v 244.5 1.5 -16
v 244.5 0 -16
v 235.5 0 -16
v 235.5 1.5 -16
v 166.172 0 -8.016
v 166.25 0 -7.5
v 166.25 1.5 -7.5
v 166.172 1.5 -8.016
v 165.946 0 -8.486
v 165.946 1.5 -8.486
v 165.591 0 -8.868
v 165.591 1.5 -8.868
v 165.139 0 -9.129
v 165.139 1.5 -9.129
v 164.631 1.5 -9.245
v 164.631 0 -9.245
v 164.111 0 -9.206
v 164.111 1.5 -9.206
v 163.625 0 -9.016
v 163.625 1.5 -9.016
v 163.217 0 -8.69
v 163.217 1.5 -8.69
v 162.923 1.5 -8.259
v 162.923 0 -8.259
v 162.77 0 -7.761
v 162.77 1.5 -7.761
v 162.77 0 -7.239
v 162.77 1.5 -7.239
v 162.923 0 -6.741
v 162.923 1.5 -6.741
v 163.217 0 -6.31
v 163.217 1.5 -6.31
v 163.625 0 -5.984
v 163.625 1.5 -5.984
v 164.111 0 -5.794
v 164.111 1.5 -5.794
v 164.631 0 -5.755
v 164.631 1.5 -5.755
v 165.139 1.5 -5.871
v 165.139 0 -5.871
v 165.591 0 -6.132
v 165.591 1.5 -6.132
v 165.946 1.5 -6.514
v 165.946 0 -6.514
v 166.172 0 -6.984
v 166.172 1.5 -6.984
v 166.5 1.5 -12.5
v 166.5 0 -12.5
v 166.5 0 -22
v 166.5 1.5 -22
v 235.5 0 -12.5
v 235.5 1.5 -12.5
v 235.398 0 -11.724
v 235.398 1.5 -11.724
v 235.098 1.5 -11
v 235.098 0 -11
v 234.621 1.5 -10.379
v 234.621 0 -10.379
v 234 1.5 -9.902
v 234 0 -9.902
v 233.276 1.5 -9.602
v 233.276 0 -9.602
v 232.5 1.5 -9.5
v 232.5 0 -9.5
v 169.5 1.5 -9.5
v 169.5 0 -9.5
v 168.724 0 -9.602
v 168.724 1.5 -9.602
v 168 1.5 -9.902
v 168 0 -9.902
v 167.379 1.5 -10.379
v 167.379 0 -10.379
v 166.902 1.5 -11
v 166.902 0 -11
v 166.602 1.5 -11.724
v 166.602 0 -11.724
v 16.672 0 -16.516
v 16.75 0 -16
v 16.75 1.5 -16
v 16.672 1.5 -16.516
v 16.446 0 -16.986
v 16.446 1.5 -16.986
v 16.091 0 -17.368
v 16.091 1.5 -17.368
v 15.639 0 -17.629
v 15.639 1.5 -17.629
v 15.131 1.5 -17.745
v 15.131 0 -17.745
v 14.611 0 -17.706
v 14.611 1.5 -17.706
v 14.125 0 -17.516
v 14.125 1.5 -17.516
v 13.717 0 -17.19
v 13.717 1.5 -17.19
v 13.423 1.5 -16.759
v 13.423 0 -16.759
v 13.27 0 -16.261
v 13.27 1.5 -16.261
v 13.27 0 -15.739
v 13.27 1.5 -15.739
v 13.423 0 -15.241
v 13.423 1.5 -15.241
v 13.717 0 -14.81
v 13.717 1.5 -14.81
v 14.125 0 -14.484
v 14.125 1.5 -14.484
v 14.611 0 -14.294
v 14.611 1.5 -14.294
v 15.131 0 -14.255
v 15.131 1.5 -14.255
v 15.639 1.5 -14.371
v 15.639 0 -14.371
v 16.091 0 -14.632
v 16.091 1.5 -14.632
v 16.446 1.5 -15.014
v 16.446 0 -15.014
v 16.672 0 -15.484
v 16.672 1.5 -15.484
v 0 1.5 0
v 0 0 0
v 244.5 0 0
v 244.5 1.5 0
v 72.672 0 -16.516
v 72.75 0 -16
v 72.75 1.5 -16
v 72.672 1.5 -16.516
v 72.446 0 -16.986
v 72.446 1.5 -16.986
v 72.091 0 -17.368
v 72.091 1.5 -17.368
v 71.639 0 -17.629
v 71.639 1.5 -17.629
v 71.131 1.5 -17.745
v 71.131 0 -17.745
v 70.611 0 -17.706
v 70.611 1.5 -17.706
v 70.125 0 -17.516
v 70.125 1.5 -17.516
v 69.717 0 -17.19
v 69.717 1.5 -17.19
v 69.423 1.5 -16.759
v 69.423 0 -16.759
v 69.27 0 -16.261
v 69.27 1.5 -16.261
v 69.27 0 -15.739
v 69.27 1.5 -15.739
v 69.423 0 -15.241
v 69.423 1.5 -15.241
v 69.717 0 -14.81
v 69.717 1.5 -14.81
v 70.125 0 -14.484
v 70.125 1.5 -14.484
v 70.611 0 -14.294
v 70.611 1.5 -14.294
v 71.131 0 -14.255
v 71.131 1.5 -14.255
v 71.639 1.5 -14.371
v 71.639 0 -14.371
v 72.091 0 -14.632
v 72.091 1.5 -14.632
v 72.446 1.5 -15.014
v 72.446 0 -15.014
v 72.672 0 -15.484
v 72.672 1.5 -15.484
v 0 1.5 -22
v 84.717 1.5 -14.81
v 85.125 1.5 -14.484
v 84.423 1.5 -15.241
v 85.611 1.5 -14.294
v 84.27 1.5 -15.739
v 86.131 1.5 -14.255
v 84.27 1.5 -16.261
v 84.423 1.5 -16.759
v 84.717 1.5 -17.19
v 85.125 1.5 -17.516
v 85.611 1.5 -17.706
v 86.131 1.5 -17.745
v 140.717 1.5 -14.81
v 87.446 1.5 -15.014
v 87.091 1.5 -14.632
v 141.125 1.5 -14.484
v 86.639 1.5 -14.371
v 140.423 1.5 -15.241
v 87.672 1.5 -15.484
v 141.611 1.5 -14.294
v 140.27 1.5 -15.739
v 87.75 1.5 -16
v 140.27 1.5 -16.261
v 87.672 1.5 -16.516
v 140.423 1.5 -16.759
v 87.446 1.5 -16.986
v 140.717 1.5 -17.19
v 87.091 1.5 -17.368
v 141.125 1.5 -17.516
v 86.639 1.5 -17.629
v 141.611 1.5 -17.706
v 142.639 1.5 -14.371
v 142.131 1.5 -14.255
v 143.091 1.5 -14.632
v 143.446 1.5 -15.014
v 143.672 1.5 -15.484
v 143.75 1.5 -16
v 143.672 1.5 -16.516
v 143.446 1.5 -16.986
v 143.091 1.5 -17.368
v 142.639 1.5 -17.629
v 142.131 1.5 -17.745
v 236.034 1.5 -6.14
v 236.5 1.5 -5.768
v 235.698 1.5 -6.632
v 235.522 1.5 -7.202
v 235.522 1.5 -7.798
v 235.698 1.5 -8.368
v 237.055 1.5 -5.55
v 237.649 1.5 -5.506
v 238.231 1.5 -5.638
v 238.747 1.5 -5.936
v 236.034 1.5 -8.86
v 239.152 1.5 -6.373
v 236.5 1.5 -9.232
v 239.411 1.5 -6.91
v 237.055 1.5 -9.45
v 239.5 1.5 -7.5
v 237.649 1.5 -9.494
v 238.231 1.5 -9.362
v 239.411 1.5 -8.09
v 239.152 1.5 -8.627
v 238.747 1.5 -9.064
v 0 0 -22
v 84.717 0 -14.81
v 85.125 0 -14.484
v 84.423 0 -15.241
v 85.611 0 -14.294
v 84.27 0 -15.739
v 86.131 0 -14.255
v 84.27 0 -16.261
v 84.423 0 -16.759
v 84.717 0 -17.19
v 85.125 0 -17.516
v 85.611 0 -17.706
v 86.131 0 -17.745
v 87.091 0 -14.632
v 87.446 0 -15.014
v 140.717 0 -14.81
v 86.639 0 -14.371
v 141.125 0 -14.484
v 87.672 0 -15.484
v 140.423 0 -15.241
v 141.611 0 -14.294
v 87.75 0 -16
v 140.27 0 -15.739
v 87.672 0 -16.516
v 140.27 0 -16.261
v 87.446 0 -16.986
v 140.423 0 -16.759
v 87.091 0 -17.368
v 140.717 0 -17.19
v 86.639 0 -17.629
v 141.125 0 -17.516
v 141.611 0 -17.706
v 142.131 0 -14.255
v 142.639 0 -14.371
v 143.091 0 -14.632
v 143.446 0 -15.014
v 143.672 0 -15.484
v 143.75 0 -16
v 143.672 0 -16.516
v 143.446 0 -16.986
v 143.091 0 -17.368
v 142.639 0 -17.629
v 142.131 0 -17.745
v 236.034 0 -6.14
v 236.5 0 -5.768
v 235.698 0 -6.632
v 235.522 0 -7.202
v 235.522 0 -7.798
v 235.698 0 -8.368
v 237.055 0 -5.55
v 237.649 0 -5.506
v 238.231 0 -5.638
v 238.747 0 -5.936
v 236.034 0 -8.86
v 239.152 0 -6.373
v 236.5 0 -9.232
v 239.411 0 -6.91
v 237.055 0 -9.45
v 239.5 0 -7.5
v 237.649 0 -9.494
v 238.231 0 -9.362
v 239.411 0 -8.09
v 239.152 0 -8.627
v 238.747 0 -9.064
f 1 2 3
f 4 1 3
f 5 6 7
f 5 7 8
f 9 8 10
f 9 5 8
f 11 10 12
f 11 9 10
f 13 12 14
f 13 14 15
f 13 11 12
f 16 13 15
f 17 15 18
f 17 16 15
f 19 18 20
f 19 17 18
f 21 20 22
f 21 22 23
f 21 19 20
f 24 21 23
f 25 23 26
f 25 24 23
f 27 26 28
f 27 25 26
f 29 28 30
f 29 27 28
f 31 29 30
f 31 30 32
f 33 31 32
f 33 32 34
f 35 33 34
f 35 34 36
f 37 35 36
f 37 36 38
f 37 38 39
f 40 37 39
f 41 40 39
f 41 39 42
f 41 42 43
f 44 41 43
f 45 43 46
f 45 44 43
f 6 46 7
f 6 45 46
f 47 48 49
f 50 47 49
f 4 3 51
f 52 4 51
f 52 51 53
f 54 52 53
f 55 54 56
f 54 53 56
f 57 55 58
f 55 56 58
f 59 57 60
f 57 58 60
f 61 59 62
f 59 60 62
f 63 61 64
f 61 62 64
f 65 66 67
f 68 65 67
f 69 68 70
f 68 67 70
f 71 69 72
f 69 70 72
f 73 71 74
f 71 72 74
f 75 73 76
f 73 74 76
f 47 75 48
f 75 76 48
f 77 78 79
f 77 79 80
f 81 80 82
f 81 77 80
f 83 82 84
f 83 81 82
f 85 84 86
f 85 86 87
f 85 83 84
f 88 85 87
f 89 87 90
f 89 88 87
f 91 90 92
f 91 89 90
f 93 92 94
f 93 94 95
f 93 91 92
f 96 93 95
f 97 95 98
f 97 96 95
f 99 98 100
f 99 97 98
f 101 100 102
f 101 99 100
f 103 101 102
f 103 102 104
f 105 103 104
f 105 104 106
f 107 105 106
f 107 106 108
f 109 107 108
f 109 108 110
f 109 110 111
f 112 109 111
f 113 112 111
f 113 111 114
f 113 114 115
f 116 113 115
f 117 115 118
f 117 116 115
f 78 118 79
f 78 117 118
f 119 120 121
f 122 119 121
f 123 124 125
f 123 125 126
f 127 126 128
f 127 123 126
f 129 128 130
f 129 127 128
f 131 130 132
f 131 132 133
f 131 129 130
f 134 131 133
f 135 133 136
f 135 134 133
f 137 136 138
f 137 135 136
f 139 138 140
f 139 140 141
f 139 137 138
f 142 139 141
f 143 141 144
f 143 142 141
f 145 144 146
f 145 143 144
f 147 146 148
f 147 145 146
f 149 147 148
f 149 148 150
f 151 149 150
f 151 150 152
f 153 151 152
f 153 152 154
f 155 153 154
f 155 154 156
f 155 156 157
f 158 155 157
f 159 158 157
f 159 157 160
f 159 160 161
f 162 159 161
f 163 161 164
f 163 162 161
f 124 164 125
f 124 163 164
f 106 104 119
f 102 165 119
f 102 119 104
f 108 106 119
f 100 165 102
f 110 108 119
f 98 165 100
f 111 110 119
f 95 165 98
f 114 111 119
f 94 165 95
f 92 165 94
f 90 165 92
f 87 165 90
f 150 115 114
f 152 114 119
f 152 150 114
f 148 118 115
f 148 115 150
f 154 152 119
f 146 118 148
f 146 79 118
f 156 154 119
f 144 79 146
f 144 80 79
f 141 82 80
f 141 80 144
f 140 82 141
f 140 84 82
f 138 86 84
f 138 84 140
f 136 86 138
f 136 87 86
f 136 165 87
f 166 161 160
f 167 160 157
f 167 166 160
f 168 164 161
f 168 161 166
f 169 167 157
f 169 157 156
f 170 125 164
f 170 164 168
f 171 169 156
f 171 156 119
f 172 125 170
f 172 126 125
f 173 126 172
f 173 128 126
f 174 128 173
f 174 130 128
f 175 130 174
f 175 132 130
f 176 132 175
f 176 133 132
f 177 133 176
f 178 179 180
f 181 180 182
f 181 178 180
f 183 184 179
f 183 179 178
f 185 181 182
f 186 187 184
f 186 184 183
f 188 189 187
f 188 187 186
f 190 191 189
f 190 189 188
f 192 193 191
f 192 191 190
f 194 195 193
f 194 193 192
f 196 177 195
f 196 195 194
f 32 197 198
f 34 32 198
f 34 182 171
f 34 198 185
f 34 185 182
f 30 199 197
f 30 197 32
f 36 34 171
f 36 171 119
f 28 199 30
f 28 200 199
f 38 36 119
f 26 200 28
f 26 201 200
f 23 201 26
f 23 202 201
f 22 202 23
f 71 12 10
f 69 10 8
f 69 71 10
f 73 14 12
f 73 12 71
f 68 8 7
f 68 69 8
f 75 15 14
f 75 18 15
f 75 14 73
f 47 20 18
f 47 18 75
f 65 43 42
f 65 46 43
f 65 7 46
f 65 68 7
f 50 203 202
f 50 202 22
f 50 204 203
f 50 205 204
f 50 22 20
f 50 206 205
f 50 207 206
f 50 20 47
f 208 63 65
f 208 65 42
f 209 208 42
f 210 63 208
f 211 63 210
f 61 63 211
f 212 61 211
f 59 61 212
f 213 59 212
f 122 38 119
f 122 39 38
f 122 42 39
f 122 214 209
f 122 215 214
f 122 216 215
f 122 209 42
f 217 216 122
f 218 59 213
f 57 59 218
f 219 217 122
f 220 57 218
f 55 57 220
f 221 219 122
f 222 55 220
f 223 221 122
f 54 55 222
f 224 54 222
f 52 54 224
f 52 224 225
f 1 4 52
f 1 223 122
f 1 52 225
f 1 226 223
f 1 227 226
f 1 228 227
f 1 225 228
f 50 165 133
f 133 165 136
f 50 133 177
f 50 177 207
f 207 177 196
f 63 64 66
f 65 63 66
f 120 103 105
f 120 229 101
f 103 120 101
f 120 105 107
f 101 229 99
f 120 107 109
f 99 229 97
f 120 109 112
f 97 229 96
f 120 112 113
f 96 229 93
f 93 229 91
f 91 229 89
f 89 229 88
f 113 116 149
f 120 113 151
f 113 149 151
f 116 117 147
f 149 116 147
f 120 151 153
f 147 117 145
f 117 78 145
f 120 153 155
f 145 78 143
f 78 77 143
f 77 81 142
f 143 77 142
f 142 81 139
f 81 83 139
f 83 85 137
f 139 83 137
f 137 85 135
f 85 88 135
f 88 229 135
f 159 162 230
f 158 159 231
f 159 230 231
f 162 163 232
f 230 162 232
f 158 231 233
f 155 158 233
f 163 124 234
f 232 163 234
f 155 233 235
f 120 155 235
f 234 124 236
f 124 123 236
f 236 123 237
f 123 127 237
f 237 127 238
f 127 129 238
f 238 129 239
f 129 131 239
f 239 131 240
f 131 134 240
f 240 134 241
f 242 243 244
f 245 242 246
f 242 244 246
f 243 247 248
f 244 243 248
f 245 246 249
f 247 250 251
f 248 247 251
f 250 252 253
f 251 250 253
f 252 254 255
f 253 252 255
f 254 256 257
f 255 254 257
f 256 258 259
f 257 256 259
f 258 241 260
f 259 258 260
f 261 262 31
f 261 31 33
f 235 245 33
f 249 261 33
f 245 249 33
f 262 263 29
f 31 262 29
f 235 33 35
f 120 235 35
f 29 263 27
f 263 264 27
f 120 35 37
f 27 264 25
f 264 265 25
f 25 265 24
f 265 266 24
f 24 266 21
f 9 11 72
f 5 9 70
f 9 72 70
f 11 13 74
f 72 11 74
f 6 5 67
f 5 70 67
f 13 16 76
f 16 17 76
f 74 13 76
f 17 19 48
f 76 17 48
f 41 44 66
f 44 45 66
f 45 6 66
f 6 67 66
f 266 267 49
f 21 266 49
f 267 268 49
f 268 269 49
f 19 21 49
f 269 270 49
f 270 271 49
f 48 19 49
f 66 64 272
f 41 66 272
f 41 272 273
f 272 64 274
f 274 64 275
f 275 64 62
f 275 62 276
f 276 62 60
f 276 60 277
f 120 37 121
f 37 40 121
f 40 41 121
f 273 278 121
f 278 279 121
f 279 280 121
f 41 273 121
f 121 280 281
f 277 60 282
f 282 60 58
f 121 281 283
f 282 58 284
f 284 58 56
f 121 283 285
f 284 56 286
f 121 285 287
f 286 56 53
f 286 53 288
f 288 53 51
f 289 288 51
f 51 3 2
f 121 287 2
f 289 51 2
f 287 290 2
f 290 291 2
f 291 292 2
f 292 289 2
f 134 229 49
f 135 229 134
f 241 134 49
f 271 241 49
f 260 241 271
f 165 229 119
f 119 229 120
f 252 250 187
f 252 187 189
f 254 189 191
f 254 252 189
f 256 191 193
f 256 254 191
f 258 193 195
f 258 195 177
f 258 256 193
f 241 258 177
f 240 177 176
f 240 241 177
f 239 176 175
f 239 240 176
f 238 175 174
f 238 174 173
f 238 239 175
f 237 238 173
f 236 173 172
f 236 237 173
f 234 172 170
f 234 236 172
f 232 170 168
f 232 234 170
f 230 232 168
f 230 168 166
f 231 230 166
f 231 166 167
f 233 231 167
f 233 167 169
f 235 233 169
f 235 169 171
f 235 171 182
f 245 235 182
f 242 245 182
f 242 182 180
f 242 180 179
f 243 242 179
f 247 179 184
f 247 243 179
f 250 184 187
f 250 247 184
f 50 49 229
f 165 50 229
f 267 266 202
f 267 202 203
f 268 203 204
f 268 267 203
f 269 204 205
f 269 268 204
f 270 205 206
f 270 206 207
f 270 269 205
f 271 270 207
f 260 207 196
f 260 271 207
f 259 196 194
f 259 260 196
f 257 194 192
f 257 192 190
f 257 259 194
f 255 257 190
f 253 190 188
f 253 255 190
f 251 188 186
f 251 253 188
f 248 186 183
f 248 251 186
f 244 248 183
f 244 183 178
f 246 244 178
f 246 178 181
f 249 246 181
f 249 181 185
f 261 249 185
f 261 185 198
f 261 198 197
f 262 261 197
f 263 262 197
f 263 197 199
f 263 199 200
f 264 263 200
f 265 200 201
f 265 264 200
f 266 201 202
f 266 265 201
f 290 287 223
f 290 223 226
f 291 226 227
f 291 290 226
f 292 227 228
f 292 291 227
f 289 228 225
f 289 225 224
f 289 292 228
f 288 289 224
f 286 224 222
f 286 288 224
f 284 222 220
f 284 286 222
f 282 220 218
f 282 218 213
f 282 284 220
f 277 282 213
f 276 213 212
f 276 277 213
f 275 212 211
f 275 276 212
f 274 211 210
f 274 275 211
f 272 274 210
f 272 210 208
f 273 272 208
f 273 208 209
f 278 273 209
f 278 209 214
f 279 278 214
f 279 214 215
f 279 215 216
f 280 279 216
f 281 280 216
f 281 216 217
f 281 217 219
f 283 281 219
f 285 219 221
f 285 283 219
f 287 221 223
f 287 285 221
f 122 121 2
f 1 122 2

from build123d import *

# Parameters (mm, degrees)
SKETCH_1_R      = 1.75
SKETCH_1_R_2    = 2
EXTRUDE_1_DEPTH = 1.5


with BuildPart() as part:
    # Эскиз1 → Бобышка-Вытянуть1 (new body)
    with BuildSketch(Plane(origin=(0, 0, 0), x_dir=(1, 0, 0), z_dir=(0, 1, 0))):
        with BuildLine():
            Line((166.5, 12.5), (166.5, 22))
            Line((166.5, 22), (0, 22))
            Line((0, 22), (0, 0))
            Line((0, 0), (244.5, 0))
            Line((244.5, 0), (244.5, 16))
            Line((244.5, 16), (235.5, 16))
            Line((235.5, 16), (235.5, 12.5))
            ThreePointArc((235.5, 12.5), (234.621320344, 10.378679656), (232.5, 9.5))
            Line((232.5, 9.5), (169.5, 9.5))
            ThreePointArc((169.5, 9.5), (167.378679656, 10.378679656), (166.5, 12.5))
        make_face()
        with Locations((164.5, 7.5)):
            Circle(SKETCH_1_R, mode=Mode.SUBTRACT)
        with Locations((237.5, 7.5)):
            Circle(SKETCH_1_R_2, mode=Mode.SUBTRACT)
        with Locations((15, 16)):
            Circle(SKETCH_1_R, mode=Mode.SUBTRACT)
        with Locations((71, 16)):
            Circle(SKETCH_1_R, mode=Mode.SUBTRACT)
        with Locations((86, 16)):
            Circle(SKETCH_1_R, mode=Mode.SUBTRACT)
        with Locations((142, 16)):
            Circle(SKETCH_1_R, mode=Mode.SUBTRACT)
    extrude(amount=EXTRUDE_1_DEPTH)


solid = part.part
